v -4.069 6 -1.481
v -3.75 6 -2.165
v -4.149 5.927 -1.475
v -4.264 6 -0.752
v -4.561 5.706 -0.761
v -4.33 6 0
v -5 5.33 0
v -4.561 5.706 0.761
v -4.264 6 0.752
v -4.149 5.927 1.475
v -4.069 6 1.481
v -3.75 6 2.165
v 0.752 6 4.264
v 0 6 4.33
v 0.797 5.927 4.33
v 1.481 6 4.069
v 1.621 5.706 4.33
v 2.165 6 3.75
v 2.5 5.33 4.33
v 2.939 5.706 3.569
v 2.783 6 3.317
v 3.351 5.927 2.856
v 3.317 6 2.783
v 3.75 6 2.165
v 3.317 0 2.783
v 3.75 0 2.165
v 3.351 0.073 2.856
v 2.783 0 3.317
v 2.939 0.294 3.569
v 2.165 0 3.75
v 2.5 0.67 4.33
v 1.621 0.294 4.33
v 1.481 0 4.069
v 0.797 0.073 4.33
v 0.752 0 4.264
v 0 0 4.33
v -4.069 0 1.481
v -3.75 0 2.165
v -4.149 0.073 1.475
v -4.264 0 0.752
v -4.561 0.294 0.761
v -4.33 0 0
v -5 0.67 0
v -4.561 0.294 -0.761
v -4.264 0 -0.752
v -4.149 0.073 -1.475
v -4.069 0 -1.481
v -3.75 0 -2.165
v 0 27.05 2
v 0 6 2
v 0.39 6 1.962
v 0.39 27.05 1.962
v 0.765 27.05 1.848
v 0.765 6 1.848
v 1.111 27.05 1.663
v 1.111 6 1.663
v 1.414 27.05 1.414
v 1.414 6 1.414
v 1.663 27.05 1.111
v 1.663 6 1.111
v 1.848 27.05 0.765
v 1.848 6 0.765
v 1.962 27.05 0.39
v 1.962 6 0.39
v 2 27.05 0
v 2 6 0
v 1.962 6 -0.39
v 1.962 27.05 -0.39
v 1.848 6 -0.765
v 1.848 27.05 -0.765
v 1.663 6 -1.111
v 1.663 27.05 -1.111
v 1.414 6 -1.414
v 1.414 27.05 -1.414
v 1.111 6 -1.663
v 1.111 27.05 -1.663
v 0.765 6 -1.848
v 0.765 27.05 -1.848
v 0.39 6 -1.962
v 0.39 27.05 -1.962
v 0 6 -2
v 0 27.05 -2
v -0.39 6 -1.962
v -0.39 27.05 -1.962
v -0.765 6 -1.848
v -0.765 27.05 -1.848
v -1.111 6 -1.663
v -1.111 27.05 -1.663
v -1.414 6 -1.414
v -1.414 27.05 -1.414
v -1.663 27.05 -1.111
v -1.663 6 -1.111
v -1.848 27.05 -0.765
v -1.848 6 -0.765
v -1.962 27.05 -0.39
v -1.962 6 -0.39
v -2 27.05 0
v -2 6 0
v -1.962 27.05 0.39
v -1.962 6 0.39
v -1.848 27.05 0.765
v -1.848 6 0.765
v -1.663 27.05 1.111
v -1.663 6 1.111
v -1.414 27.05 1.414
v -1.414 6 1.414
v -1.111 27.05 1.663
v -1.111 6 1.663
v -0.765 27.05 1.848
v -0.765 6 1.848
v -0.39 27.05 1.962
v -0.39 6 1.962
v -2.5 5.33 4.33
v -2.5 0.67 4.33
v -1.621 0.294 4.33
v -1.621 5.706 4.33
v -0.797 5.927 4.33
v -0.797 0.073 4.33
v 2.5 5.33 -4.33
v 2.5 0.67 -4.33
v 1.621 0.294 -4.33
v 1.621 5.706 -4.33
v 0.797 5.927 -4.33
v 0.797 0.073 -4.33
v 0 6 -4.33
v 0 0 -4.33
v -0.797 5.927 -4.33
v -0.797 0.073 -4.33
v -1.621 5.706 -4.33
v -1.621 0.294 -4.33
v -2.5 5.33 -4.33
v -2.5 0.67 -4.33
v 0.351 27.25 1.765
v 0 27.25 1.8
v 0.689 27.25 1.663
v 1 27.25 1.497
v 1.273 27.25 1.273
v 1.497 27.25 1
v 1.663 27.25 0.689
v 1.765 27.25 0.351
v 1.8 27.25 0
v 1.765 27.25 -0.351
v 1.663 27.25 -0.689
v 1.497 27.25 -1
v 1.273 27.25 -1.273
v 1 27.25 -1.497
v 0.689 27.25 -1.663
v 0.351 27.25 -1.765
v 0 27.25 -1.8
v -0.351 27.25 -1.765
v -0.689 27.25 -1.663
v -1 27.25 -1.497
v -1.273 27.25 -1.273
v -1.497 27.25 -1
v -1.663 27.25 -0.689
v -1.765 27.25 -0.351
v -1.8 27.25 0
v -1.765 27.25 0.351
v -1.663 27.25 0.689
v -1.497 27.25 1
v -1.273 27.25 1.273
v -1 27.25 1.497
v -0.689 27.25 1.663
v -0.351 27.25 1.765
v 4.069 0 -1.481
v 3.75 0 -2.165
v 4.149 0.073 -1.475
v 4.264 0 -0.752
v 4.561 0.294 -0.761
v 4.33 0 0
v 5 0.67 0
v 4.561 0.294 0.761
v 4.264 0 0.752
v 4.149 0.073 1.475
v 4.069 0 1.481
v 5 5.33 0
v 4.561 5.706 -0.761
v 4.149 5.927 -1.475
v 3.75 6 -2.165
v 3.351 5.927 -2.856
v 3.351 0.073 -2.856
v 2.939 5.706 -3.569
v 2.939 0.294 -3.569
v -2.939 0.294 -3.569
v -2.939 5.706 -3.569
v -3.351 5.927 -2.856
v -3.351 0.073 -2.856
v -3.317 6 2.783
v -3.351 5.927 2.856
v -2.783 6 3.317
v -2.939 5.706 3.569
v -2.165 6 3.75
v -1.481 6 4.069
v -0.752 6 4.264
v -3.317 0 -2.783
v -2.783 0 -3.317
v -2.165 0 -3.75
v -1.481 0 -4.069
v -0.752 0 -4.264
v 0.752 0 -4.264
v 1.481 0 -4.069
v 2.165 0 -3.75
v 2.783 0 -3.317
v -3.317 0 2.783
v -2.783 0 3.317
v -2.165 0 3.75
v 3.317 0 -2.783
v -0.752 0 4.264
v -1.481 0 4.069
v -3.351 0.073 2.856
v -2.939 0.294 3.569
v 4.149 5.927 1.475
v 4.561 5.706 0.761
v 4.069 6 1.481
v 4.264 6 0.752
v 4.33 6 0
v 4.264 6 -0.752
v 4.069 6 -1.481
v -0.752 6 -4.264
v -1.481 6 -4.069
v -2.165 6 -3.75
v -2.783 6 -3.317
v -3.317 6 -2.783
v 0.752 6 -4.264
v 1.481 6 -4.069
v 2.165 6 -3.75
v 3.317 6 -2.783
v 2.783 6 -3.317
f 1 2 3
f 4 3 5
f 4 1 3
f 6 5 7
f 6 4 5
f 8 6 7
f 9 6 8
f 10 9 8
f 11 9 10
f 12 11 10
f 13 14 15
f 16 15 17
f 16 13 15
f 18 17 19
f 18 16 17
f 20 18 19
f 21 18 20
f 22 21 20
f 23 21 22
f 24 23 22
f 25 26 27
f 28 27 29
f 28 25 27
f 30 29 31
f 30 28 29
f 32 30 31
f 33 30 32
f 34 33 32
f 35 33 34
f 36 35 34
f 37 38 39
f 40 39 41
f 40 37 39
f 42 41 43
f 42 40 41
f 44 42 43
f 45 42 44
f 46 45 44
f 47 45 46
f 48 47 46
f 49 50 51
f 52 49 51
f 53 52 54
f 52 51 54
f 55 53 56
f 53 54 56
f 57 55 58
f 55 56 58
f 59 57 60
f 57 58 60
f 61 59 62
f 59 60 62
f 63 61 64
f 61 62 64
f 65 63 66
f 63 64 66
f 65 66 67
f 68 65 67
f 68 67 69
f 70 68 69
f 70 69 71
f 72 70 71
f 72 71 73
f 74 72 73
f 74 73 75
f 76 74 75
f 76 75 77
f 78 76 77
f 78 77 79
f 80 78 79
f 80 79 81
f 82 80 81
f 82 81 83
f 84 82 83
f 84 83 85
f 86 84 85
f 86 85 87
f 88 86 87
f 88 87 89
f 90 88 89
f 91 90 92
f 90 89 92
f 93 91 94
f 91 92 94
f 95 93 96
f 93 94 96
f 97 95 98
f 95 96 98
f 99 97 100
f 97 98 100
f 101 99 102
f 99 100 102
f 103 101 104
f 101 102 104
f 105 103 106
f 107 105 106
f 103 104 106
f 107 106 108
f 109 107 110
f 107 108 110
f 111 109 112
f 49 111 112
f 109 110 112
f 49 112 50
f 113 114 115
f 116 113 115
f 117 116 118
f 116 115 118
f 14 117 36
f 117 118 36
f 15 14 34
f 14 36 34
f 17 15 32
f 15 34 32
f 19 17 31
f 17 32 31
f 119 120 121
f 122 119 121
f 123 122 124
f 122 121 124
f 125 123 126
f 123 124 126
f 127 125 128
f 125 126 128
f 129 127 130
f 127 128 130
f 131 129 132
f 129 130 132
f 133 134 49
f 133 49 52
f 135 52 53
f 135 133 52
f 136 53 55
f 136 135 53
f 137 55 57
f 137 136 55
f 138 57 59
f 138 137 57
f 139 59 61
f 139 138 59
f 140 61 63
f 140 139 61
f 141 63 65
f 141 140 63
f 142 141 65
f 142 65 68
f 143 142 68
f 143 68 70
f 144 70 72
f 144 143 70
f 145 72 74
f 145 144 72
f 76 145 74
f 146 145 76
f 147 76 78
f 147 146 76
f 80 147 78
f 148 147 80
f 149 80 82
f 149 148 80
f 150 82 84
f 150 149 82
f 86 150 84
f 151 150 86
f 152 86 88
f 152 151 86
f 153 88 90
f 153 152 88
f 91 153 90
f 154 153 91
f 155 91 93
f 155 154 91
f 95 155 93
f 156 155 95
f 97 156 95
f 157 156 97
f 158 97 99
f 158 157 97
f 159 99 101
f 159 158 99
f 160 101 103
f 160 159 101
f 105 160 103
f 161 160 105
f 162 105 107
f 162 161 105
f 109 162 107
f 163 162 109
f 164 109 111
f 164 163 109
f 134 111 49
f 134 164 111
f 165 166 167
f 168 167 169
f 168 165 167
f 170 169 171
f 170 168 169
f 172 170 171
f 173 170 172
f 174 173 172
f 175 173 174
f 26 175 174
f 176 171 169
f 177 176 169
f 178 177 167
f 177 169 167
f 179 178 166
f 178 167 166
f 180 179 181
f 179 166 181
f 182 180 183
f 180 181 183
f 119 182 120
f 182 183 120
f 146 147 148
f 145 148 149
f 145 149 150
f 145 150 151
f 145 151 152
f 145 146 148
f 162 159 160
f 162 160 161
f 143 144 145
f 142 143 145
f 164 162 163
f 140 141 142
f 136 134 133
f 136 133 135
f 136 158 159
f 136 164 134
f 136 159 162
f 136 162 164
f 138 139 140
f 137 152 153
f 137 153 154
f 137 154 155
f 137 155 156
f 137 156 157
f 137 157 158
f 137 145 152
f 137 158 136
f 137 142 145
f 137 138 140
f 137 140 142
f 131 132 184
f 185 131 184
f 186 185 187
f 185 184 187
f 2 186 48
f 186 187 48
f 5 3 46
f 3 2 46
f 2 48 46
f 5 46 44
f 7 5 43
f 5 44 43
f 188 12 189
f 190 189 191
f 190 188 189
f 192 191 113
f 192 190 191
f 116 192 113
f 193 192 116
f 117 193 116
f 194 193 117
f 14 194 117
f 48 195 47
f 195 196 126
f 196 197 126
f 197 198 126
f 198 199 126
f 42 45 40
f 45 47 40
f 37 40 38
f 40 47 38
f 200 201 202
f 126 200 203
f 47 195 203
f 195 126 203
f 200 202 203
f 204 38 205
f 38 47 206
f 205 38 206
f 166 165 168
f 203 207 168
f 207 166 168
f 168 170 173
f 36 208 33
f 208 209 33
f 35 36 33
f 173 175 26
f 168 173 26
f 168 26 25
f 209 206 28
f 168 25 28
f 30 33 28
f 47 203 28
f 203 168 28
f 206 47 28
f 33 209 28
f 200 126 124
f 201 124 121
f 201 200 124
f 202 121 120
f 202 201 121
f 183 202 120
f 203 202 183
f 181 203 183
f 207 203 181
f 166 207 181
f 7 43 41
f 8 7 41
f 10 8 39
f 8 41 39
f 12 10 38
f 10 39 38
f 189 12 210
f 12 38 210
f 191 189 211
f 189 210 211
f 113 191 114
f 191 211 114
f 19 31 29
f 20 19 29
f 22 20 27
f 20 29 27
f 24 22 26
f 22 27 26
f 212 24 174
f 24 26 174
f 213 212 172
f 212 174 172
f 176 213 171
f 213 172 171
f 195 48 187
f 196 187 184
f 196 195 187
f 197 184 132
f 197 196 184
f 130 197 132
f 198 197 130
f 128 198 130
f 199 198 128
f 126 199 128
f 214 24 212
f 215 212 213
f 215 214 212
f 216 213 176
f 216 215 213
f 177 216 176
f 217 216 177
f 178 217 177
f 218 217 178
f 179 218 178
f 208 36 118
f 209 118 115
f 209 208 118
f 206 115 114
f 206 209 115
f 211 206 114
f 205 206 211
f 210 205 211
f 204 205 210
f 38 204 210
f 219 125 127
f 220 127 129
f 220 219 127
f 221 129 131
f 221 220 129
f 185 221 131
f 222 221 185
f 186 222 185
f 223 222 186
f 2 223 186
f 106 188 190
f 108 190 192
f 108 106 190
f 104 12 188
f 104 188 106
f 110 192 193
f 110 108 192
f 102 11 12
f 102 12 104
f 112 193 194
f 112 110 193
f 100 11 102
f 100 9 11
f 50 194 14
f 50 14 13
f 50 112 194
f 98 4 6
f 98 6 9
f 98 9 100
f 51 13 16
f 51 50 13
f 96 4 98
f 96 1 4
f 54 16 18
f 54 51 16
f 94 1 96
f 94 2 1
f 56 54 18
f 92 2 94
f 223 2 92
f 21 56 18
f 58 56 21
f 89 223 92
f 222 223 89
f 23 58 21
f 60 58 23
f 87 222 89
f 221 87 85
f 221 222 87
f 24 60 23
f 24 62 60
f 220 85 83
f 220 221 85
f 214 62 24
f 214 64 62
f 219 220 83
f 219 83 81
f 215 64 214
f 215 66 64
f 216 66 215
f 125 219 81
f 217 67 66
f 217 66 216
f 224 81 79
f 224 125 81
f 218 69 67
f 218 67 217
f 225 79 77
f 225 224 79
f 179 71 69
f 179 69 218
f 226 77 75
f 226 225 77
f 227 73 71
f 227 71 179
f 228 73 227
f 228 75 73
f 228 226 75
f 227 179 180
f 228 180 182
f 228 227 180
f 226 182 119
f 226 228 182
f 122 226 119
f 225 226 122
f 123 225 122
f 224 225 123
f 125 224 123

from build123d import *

# Parameters (mm, degrees)
BOSS_EXTRUDE1_DEPTH = 6
SKETCH1_3_R         = 2
BOSS_EXTRUDE2_DEPTH = 27.25
SKETCH2_OUTSIDE_W   = 76.14
SKETCH2_OUTSIDE_H   = 74.8
SKETCH2_OUTSIDE_R   = 4.330127019
CUT_EXTRUDE5_DEPTH  = 29.041264237
CUT_EXTRUDE5_DRAFT  = -45
CHAMFER1_SIZE       = 0.2
SKETCH3_OUTSIDE_W   = 64.57
SKETCH3_OUTSIDE_H   = 63.23
SKETCH3_OUTSIDE_R   = 4.330127019
CUT_EXTRUDE6_DEPTH  = 23.255617268
CUT_EXTRUDE6_DRAFT  = -45


with BuildPart() as part:
    # Sketch1 → Boss-Extrude1 (new body)
    with BuildSketch(Plane(origin=(0, 0, 0), x_dir=(1, 0, 0), z_dir=(0, 1, 0))):
        Polygon((-2.5, -4.330127019), (2.5, -4.330127019), (5, 0), (2.5, 4.330127019), (-2.5, 4.330127019), (-5, 0), align=None)
    extrude(amount=BOSS_EXTRUDE1_DEPTH)

    # Sketch1<3> → Boss-Extrude2 (add)
    with BuildSketch(Plane(origin=(0, 0, 0), x_dir=(1, 0, 0), z_dir=(0, 1, 0))):
        Circle(SKETCH1_3_R)
    extrude(amount=BOSS_EXTRUDE2_DEPTH)


with BuildPart() as cut_extrude5_tool:
    # Sketch2 outside → Cut-Extrude5 (with draft: the straight prism first)
    with BuildSketch(Plane.XZ):
        Rectangle(SKETCH2_OUTSIDE_W, SKETCH2_OUTSIDE_H)
        Circle(SKETCH2_OUTSIDE_R, mode=Mode.SUBTRACT)
    extrude(amount=-CUT_EXTRUDE5_DEPTH)
    # Cut-Extrude5: the draft: its side faces are tilted about the plane it starts from
    cut_extrude5_sides = [cut_extrude5_tool.faces().sort_by_distance(p)[0] for p in [
        (0, 14.520632118, -37.4),
        (38.07, 14.520632118, 0),
        (0, 14.520632118, 37.4),
        (-38.07, 14.520632118, 0),
        (-4.330127019, 14.520632118, 0),
    ]]
    draft(cut_extrude5_sides, Plane.XZ, CUT_EXTRUDE5_DRAFT)


with BuildPart() as part_1:
    add(part.part)

    # Cut-Extrude5: cut by cut_extrude5_tool
    add(cut_extrude5_tool.part, mode=Mode.SUBTRACT)

    # Chamfer1
    chamfer1_edges = [part_1.edges().sort_by_distance(p)[0] for p in [
        (-2, 27.25, 0),
    ]]
    chamfer(chamfer1_edges, length=CHAMFER1_SIZE)


with BuildPart() as cut_extrude6_tool:
    # Sketch3 outside → Cut-Extrude6 (with draft: the straight prism first)
    with BuildSketch(Plane(origin=(0, 6, 0), x_dir=(1, 0, 0), z_dir=(0, 1, 0))):
        Rectangle(SKETCH3_OUTSIDE_W, SKETCH3_OUTSIDE_H)
        Circle(SKETCH3_OUTSIDE_R, mode=Mode.SUBTRACT)
    extrude(amount=-CUT_EXTRUDE6_DEPTH)
    # Cut-Extrude6: the draft: its side faces are tilted about the plane it starts from
    cut_extrude6_sides = [cut_extrude6_tool.faces().sort_by_distance(p)[0] for p in [
        (0, -5.627808634, 31.615),
        (32.285, -5.627808634, 0),
        (0, -5.627808634, -31.615),
        (-32.285, -5.627808634, 0),
        (-4.330127019, -5.627808634, 0),
    ]]
    draft(cut_extrude6_sides, Plane(origin=(0, 6, 0), x_dir=(1, 0, 0), z_dir=(0, 1, 0)), CUT_EXTRUDE6_DRAFT)


with BuildPart() as part_2:
    add(part_1.part)

    # Cut-Extrude6: cut by cut_extrude6_tool
    add(cut_extrude6_tool.part, mode=Mode.SUBTRACT)


solid = part_2.part
